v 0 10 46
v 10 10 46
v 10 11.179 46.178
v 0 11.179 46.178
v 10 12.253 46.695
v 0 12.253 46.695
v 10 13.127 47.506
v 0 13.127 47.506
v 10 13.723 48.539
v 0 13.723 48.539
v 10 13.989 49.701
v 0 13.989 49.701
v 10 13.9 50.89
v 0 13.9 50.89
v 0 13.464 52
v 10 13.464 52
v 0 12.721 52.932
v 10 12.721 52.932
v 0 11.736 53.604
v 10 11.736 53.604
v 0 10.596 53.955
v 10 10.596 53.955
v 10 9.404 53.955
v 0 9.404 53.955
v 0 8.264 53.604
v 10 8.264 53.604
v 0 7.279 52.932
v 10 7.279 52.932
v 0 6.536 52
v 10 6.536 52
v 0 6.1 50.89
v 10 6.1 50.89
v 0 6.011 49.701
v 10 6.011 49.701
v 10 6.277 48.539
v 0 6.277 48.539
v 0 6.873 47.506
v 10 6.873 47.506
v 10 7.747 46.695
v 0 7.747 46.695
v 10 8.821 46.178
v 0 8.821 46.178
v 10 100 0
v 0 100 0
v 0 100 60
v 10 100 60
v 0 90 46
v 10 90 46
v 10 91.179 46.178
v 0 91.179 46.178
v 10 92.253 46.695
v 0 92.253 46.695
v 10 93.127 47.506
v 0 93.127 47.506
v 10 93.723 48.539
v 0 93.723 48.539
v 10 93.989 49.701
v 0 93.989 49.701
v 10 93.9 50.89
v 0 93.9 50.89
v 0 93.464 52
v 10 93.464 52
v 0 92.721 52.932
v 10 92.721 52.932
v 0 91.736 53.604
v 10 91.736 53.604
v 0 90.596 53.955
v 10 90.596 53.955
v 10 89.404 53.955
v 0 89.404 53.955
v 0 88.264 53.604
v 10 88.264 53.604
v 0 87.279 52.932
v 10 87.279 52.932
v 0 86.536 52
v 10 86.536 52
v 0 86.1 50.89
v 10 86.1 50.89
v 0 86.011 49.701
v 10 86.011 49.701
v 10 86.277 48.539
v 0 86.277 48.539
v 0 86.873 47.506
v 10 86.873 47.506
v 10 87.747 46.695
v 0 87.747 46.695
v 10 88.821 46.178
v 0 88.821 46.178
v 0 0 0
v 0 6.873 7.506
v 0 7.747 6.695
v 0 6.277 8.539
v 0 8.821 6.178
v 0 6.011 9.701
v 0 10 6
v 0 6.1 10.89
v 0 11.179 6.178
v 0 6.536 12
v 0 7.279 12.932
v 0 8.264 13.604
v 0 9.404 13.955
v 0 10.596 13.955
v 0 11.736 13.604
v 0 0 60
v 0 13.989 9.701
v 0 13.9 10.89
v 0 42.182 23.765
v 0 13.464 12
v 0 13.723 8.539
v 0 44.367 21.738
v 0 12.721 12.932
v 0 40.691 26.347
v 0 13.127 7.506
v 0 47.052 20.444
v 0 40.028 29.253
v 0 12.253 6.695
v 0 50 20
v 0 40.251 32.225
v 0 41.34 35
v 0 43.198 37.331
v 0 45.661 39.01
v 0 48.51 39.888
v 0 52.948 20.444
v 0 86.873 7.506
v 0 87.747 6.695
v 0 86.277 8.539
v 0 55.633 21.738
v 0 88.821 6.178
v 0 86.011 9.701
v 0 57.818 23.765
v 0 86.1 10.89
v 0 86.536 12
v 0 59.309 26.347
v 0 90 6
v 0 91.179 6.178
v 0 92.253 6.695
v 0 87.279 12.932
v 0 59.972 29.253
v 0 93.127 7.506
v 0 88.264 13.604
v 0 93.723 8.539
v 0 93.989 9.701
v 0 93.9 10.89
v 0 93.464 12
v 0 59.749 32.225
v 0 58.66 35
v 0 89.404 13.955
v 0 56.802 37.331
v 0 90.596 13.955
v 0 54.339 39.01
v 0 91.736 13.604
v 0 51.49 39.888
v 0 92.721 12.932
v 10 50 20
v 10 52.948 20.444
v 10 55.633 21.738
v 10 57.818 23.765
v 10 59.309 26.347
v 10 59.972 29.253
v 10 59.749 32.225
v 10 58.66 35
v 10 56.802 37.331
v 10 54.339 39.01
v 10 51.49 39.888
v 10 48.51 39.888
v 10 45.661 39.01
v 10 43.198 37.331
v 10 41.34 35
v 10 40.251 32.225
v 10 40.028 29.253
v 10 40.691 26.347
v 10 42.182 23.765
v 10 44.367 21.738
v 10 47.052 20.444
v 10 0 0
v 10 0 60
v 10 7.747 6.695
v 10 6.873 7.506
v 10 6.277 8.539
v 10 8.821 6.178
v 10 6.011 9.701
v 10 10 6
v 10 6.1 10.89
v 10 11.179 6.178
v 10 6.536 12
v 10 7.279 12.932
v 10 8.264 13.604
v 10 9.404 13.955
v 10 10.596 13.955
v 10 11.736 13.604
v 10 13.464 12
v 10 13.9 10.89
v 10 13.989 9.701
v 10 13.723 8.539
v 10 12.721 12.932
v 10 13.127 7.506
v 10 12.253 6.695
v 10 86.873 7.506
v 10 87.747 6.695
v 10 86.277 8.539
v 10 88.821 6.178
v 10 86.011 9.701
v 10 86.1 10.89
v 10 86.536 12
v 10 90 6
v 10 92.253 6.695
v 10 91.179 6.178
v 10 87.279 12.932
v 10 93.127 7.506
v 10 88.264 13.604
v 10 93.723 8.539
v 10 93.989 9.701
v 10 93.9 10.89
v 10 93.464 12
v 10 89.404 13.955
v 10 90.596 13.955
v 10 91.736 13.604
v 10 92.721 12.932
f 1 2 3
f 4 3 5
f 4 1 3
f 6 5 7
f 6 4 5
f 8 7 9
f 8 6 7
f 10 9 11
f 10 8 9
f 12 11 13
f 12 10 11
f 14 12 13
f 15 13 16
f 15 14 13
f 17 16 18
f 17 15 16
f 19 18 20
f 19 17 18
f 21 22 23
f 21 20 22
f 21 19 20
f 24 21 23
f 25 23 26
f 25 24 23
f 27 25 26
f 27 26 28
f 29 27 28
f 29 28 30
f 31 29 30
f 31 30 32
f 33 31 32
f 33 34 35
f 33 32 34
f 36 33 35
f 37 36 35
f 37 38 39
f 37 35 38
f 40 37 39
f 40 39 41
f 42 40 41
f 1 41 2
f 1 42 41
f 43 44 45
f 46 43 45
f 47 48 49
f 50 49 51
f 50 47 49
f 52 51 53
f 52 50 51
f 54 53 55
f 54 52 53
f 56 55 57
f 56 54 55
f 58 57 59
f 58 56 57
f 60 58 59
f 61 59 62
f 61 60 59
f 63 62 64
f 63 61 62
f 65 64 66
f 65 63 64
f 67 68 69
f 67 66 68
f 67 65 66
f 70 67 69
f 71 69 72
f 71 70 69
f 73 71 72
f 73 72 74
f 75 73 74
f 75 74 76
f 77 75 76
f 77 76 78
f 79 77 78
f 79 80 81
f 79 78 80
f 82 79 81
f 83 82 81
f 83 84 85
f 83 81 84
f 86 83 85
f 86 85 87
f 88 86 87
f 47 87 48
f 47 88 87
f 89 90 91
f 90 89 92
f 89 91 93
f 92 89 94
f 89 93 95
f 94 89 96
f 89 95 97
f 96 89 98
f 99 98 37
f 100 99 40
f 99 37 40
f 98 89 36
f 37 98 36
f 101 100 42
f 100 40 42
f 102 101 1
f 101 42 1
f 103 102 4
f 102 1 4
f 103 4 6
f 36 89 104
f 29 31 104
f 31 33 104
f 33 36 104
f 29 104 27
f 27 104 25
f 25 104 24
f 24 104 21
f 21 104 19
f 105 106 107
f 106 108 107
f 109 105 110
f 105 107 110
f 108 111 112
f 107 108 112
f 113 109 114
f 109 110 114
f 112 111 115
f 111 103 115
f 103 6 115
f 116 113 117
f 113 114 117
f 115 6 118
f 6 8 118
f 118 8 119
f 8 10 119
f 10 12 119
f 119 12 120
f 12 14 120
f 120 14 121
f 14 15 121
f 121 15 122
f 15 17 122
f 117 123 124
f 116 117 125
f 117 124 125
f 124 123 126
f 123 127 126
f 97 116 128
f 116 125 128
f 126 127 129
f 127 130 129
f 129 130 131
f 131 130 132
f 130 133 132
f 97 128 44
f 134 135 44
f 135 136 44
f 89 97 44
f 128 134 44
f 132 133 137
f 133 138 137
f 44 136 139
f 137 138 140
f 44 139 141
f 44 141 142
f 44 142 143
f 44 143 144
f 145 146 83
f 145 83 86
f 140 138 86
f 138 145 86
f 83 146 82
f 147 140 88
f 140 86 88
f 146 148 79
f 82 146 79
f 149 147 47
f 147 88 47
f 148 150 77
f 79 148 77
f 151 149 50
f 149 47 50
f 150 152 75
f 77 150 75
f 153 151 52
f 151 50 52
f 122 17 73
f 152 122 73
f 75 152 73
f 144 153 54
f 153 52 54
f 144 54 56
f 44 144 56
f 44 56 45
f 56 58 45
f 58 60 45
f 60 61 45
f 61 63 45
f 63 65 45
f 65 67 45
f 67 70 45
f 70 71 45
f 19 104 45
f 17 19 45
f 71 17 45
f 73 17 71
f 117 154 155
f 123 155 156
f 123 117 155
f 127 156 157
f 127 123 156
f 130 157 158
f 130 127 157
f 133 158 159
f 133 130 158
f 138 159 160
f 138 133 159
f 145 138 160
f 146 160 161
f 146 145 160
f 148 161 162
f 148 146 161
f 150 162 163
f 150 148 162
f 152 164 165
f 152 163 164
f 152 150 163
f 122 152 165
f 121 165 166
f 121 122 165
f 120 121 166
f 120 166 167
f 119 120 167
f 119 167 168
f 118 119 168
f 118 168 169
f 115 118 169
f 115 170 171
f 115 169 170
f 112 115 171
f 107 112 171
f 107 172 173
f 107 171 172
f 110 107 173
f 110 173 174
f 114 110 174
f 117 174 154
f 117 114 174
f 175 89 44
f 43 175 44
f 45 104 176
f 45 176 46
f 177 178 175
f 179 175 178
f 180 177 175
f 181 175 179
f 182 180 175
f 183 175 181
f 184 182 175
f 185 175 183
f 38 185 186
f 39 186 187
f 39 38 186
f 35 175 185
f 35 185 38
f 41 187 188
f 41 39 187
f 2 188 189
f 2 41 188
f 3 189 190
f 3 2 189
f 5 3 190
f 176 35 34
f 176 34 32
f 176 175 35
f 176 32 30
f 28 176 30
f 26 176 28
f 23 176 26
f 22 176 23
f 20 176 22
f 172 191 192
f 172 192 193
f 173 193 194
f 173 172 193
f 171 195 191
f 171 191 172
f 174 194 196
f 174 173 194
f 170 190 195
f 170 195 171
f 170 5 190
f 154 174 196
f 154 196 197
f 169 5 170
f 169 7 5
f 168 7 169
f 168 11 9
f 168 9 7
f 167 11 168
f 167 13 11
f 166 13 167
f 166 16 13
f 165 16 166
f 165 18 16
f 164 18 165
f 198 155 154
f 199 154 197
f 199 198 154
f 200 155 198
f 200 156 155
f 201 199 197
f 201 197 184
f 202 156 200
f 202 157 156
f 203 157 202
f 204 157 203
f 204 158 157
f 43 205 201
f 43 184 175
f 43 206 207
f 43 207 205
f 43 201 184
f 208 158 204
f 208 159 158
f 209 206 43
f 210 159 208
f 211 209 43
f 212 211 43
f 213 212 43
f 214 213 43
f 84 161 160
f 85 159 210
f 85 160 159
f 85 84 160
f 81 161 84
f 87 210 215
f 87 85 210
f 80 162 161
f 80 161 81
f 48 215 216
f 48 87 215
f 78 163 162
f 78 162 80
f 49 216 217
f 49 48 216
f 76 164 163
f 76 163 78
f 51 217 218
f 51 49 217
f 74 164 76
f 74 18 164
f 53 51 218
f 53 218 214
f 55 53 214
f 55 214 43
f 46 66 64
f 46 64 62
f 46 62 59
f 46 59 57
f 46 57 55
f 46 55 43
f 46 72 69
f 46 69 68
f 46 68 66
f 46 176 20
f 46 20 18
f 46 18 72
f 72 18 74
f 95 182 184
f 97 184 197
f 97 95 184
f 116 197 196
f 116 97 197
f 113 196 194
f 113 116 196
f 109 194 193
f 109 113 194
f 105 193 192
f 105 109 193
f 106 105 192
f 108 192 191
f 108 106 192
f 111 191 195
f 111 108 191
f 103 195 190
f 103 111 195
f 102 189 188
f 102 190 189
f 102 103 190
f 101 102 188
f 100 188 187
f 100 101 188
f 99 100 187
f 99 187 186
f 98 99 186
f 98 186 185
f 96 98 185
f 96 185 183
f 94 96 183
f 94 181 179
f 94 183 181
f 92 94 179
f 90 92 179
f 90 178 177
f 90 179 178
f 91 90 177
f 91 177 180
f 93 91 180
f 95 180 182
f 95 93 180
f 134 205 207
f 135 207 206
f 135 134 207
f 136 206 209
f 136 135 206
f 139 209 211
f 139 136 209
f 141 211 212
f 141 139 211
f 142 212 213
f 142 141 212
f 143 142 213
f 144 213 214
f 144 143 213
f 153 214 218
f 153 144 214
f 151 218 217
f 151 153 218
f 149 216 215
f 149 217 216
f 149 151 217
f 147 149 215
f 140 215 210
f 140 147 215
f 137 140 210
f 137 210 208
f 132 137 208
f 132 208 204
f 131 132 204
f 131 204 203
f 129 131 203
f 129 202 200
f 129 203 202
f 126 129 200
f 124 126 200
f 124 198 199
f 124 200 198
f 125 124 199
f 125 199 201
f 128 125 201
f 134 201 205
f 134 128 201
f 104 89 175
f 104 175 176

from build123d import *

# Parameters (mm, degrees)
SKETCH1_W           = 100
SKETCH1_H           = 60
BOSS_EXTRUDE1_DEPTH = 10
SKETCH2_R           = 4
CUT_EXTRUDE2_DEPTH  = 118.046999107
SKETCH3_R           = 10
CUT_EXTRUDE4_DEPTH  = 118.046999107


with BuildPart() as part:
    # Sketch1 → Boss-Extrude1 (new body)
    with BuildSketch(Plane.YZ):
        with Locations((50, 30)):
            Rectangle(SKETCH1_W, SKETCH1_H)
    extrude(amount=BOSS_EXTRUDE1_DEPTH)

    # Sketch2 → Cut-Extrude2 (cut, through all)
    with BuildSketch(Plane.YZ):
        with Locations(Location((10, 10, 0), (0, 0, 270))):
            Circle(SKETCH2_R)
        with Locations(Location((90, 10, 0), (0, 0, 270))):
            Circle(SKETCH2_R)
        with Locations(Location((10, 50, 0), (0, 0, 270))):
            Circle(SKETCH2_R)
        with Locations(Location((90, 50, 0), (0, 0, 270))):
            Circle(SKETCH2_R)
    extrude(amount=CUT_EXTRUDE2_DEPTH, mode=Mode.SUBTRACT)

    # Sketch3 → Cut-Extrude4 (cut, through all)
    with BuildSketch(Plane.YZ):
        with Locations(Location((50, 30, 0), (0, 0, 270))):
            Circle(SKETCH3_R)
    extrude(amount=CUT_EXTRUDE4_DEPTH, mode=Mode.SUBTRACT)


solid = part.part
